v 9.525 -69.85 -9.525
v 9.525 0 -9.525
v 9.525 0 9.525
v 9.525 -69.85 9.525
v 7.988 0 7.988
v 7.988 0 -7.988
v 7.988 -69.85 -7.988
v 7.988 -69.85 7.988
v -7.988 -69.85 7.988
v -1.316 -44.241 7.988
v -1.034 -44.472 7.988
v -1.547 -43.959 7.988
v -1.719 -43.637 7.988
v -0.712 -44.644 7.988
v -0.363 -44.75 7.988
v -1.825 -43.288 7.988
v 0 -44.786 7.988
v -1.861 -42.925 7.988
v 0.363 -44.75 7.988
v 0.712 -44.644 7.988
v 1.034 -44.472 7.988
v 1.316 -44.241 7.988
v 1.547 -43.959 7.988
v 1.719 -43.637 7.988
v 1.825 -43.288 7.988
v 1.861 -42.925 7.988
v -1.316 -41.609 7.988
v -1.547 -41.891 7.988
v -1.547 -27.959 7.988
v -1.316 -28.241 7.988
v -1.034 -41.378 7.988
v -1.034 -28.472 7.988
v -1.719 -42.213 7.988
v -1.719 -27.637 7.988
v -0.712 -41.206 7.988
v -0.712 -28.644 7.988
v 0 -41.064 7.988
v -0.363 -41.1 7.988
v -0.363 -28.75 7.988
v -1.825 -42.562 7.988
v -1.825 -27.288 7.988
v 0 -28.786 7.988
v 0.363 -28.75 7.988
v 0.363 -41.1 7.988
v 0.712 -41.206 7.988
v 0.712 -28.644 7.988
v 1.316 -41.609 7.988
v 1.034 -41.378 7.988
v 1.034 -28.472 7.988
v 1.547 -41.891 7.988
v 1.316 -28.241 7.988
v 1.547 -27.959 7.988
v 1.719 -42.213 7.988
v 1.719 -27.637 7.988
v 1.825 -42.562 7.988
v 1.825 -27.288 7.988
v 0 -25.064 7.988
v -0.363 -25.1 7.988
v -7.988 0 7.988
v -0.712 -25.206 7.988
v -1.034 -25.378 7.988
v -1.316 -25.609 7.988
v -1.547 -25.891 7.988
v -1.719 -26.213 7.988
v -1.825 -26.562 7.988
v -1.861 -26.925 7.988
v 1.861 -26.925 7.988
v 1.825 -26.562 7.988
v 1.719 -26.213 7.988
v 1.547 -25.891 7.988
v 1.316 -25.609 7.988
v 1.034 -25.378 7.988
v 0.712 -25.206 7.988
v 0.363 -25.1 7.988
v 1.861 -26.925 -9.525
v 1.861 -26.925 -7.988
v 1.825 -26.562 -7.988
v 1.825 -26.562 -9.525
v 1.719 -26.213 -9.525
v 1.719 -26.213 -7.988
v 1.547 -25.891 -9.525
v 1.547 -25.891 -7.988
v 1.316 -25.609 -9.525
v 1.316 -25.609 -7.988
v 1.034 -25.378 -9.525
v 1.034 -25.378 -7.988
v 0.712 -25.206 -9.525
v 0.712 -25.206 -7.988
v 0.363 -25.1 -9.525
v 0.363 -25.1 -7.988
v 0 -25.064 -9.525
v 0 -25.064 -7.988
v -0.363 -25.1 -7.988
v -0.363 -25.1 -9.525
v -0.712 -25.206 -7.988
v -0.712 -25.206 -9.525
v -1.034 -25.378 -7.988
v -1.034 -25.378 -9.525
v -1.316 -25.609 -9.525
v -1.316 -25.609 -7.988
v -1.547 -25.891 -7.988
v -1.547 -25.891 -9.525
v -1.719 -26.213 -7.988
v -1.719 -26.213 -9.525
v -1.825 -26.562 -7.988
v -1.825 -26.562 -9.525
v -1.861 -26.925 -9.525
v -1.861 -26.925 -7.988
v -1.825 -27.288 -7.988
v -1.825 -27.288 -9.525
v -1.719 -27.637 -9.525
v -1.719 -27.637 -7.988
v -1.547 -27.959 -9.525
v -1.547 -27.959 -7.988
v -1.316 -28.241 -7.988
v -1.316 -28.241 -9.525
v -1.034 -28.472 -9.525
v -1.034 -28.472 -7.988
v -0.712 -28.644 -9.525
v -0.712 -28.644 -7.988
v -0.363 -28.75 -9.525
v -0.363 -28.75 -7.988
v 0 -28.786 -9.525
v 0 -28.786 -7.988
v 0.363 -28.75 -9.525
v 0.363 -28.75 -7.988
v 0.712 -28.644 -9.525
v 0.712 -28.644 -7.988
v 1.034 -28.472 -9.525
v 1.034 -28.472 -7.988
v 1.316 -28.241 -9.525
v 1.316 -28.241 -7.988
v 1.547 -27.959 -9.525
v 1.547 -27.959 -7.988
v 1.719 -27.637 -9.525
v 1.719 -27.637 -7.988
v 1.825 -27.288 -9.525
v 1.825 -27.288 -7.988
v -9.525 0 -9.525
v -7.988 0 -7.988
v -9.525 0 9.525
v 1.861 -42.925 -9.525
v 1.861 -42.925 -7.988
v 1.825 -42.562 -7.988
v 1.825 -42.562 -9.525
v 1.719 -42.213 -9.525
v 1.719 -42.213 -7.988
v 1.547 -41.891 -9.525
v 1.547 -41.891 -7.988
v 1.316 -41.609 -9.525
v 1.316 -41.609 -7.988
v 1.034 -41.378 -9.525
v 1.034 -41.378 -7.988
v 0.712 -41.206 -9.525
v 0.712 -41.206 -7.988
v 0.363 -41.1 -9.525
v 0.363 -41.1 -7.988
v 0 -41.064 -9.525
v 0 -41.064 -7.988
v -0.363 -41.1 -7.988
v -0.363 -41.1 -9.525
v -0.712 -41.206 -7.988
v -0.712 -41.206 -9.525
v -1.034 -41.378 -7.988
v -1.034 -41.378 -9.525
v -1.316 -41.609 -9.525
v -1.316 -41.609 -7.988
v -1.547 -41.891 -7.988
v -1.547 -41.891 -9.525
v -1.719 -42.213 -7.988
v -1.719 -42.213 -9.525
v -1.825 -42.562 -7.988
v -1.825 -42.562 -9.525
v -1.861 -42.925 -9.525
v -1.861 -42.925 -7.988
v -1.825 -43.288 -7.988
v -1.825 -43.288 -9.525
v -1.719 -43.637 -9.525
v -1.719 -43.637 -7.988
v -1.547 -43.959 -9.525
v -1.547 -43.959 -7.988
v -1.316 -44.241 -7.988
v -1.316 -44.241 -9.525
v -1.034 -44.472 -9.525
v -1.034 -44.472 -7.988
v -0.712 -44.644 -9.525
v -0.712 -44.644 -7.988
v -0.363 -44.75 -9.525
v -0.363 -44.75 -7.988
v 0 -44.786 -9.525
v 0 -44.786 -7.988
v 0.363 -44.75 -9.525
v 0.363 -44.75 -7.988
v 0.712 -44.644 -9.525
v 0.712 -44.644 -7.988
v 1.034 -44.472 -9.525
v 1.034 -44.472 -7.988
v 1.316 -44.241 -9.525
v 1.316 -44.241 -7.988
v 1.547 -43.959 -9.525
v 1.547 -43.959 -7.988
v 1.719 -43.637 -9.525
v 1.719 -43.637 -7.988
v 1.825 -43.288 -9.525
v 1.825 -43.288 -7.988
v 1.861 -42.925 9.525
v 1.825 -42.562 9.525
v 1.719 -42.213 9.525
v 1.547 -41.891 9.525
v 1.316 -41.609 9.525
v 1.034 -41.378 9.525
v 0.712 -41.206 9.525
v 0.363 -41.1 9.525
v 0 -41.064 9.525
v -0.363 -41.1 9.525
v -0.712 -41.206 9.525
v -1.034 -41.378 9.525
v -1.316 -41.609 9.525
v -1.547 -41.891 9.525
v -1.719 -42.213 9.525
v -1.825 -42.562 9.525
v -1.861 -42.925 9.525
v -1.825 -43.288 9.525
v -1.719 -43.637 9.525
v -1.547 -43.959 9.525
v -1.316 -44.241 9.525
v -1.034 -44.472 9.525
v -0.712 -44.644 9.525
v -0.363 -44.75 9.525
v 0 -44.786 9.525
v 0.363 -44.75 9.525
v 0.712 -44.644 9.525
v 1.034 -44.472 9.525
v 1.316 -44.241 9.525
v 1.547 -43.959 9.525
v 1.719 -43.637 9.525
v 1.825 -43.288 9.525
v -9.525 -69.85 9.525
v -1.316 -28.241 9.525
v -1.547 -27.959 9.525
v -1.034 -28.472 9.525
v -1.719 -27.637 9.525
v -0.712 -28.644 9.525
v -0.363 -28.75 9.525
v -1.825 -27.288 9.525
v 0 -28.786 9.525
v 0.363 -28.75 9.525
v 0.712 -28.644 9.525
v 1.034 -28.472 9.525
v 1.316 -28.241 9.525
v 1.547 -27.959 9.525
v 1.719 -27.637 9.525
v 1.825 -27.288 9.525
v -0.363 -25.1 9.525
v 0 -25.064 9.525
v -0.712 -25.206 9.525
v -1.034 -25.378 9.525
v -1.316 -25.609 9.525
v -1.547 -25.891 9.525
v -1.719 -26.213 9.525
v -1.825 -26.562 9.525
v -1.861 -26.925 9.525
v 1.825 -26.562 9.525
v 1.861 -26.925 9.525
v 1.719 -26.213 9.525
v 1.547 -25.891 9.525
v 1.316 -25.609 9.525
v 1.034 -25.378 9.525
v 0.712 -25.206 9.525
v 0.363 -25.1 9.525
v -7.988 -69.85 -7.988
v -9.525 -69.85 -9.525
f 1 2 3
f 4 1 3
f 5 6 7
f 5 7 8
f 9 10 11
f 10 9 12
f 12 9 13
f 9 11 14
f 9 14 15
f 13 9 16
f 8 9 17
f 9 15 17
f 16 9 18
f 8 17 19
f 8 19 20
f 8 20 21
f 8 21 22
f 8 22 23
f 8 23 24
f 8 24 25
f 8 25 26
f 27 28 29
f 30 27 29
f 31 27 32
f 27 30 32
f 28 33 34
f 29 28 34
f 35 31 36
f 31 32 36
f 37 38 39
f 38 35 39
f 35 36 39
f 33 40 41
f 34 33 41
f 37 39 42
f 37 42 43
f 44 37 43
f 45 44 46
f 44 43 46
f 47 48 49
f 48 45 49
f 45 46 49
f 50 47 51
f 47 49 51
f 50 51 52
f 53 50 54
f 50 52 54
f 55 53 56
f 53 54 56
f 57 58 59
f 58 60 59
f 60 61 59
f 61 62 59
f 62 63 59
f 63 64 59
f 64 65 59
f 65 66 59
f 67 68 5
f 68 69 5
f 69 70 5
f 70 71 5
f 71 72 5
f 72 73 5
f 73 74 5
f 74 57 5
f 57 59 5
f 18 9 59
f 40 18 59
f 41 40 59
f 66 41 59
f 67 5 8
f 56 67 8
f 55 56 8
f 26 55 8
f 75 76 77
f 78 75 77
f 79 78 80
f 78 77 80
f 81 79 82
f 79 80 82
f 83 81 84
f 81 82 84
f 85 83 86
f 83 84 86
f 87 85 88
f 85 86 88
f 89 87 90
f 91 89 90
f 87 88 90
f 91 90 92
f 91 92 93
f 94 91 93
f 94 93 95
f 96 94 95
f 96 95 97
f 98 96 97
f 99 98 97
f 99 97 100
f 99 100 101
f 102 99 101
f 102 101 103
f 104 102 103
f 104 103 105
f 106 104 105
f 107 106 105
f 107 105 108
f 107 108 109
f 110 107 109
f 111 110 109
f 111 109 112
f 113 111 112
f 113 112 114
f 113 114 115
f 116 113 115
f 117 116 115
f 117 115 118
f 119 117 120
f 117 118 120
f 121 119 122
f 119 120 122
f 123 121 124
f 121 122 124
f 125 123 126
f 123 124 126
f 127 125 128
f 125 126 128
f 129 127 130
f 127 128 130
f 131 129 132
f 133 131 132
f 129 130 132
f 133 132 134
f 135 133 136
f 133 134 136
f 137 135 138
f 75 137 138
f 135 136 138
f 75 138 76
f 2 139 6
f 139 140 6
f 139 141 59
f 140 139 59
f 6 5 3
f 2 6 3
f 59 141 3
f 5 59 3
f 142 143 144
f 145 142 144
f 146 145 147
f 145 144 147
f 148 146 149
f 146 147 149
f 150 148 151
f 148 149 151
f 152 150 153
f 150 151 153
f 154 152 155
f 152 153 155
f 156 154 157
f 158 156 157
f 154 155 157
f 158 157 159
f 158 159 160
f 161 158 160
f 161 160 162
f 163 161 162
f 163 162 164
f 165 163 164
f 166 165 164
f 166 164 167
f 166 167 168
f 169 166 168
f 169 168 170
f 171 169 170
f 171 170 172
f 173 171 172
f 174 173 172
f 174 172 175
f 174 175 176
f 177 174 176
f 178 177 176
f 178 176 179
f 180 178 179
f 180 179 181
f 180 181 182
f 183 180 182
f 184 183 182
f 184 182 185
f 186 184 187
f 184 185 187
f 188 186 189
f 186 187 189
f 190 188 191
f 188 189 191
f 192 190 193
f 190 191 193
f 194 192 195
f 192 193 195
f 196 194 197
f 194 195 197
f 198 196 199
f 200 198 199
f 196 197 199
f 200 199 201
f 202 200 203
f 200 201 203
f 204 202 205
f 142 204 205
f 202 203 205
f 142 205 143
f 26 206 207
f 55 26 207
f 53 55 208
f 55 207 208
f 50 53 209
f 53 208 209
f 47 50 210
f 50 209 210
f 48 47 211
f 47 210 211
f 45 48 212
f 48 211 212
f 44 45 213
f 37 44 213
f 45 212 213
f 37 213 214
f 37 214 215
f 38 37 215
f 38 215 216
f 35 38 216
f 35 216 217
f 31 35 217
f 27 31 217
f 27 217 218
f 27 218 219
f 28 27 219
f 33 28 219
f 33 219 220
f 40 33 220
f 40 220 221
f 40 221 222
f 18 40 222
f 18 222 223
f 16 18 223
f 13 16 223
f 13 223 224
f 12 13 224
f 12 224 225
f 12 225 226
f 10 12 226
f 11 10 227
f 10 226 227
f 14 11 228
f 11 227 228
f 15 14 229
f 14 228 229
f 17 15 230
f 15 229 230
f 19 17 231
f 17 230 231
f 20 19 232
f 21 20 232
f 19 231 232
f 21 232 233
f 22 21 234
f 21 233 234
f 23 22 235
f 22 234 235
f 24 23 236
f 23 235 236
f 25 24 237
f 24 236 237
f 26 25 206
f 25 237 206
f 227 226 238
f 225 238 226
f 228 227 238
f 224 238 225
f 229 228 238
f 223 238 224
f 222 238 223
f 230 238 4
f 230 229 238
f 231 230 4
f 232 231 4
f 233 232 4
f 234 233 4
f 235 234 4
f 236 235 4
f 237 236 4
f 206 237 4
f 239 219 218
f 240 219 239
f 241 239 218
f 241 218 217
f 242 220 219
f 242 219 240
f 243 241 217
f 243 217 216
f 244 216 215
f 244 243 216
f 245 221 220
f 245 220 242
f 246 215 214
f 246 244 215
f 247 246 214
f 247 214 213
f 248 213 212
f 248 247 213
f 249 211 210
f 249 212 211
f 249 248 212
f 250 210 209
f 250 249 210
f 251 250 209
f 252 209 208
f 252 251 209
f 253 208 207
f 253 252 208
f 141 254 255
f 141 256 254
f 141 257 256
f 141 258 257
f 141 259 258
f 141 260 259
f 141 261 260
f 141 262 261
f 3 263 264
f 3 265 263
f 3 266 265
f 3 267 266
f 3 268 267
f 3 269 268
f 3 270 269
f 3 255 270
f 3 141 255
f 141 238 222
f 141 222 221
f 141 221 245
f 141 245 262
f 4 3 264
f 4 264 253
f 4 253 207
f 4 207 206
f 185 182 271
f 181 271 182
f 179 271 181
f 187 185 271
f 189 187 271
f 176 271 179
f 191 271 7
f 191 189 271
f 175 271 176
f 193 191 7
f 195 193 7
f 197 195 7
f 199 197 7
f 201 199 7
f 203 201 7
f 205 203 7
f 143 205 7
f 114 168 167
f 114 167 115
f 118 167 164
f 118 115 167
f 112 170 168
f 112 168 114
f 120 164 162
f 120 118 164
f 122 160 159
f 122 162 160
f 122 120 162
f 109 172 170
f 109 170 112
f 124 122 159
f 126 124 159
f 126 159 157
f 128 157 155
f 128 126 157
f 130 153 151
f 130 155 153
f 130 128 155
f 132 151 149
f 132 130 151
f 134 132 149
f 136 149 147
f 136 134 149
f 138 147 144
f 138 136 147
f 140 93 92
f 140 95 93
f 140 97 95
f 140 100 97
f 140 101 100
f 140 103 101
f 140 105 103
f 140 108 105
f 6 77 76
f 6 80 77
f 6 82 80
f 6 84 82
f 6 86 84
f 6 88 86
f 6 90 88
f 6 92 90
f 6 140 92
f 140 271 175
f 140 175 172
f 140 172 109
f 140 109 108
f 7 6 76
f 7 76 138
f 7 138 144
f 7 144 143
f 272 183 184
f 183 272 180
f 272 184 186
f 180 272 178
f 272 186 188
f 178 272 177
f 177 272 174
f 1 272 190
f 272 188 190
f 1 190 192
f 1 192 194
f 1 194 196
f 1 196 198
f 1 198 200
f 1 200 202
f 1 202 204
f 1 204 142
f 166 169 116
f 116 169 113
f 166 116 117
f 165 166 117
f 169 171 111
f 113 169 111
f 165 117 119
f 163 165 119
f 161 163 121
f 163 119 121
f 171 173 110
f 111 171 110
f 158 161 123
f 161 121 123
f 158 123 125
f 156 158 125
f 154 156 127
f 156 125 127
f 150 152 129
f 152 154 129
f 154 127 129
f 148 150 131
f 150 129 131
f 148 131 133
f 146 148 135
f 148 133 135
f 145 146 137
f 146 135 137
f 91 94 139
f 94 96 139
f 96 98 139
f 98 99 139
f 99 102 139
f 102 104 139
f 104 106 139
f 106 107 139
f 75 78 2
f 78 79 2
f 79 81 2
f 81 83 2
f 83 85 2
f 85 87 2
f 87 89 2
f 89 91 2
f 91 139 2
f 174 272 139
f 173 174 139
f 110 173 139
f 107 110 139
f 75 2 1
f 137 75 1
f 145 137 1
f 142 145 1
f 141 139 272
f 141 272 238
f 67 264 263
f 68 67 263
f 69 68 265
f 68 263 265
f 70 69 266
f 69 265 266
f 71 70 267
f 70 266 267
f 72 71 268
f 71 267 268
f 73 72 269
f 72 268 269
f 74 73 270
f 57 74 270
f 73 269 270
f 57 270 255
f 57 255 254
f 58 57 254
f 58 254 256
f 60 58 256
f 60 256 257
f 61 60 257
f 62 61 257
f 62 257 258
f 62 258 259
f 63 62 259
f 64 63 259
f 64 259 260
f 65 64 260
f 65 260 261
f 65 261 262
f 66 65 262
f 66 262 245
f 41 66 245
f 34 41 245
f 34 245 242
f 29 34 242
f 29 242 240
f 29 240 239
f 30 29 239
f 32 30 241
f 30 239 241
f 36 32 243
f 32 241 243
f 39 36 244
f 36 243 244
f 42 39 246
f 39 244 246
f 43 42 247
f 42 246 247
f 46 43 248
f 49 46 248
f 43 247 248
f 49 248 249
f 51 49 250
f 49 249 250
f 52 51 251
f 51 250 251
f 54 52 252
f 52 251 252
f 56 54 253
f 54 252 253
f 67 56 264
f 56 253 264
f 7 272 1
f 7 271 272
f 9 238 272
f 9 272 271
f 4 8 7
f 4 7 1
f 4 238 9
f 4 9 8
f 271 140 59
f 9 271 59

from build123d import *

# Parameters (mm, degrees)
F0_W     = 19.05
F0_H     = 19.05
F0_W_2   = 15.9766
F0_H_2   = 15.9766
F1_DEPTH = 69.85
F2_R     = 1.86055
F3_DEPTH = 19.05


with BuildPart() as f1:
    # F0 (on Front) → F1 (new body)
    with BuildSketch(Plane.XZ):
        Rectangle(F0_W, F0_H)
        Rectangle(F0_W_2, F0_H_2, mode=Mode.SUBTRACT)
    extrude(amount=F1_DEPTH)

    # F2 (on face) → F3 (cut, through all)
    with BuildSketch(Plane.XY.offset(9.525)):
        with Locations((0, -26.925)):
            Circle(F2_R)
        with Locations((0, -42.925)):
            Circle(F2_R)
    extrude(amount=-F3_DEPTH, mode=Mode.SUBTRACT)


solid = f1.part
